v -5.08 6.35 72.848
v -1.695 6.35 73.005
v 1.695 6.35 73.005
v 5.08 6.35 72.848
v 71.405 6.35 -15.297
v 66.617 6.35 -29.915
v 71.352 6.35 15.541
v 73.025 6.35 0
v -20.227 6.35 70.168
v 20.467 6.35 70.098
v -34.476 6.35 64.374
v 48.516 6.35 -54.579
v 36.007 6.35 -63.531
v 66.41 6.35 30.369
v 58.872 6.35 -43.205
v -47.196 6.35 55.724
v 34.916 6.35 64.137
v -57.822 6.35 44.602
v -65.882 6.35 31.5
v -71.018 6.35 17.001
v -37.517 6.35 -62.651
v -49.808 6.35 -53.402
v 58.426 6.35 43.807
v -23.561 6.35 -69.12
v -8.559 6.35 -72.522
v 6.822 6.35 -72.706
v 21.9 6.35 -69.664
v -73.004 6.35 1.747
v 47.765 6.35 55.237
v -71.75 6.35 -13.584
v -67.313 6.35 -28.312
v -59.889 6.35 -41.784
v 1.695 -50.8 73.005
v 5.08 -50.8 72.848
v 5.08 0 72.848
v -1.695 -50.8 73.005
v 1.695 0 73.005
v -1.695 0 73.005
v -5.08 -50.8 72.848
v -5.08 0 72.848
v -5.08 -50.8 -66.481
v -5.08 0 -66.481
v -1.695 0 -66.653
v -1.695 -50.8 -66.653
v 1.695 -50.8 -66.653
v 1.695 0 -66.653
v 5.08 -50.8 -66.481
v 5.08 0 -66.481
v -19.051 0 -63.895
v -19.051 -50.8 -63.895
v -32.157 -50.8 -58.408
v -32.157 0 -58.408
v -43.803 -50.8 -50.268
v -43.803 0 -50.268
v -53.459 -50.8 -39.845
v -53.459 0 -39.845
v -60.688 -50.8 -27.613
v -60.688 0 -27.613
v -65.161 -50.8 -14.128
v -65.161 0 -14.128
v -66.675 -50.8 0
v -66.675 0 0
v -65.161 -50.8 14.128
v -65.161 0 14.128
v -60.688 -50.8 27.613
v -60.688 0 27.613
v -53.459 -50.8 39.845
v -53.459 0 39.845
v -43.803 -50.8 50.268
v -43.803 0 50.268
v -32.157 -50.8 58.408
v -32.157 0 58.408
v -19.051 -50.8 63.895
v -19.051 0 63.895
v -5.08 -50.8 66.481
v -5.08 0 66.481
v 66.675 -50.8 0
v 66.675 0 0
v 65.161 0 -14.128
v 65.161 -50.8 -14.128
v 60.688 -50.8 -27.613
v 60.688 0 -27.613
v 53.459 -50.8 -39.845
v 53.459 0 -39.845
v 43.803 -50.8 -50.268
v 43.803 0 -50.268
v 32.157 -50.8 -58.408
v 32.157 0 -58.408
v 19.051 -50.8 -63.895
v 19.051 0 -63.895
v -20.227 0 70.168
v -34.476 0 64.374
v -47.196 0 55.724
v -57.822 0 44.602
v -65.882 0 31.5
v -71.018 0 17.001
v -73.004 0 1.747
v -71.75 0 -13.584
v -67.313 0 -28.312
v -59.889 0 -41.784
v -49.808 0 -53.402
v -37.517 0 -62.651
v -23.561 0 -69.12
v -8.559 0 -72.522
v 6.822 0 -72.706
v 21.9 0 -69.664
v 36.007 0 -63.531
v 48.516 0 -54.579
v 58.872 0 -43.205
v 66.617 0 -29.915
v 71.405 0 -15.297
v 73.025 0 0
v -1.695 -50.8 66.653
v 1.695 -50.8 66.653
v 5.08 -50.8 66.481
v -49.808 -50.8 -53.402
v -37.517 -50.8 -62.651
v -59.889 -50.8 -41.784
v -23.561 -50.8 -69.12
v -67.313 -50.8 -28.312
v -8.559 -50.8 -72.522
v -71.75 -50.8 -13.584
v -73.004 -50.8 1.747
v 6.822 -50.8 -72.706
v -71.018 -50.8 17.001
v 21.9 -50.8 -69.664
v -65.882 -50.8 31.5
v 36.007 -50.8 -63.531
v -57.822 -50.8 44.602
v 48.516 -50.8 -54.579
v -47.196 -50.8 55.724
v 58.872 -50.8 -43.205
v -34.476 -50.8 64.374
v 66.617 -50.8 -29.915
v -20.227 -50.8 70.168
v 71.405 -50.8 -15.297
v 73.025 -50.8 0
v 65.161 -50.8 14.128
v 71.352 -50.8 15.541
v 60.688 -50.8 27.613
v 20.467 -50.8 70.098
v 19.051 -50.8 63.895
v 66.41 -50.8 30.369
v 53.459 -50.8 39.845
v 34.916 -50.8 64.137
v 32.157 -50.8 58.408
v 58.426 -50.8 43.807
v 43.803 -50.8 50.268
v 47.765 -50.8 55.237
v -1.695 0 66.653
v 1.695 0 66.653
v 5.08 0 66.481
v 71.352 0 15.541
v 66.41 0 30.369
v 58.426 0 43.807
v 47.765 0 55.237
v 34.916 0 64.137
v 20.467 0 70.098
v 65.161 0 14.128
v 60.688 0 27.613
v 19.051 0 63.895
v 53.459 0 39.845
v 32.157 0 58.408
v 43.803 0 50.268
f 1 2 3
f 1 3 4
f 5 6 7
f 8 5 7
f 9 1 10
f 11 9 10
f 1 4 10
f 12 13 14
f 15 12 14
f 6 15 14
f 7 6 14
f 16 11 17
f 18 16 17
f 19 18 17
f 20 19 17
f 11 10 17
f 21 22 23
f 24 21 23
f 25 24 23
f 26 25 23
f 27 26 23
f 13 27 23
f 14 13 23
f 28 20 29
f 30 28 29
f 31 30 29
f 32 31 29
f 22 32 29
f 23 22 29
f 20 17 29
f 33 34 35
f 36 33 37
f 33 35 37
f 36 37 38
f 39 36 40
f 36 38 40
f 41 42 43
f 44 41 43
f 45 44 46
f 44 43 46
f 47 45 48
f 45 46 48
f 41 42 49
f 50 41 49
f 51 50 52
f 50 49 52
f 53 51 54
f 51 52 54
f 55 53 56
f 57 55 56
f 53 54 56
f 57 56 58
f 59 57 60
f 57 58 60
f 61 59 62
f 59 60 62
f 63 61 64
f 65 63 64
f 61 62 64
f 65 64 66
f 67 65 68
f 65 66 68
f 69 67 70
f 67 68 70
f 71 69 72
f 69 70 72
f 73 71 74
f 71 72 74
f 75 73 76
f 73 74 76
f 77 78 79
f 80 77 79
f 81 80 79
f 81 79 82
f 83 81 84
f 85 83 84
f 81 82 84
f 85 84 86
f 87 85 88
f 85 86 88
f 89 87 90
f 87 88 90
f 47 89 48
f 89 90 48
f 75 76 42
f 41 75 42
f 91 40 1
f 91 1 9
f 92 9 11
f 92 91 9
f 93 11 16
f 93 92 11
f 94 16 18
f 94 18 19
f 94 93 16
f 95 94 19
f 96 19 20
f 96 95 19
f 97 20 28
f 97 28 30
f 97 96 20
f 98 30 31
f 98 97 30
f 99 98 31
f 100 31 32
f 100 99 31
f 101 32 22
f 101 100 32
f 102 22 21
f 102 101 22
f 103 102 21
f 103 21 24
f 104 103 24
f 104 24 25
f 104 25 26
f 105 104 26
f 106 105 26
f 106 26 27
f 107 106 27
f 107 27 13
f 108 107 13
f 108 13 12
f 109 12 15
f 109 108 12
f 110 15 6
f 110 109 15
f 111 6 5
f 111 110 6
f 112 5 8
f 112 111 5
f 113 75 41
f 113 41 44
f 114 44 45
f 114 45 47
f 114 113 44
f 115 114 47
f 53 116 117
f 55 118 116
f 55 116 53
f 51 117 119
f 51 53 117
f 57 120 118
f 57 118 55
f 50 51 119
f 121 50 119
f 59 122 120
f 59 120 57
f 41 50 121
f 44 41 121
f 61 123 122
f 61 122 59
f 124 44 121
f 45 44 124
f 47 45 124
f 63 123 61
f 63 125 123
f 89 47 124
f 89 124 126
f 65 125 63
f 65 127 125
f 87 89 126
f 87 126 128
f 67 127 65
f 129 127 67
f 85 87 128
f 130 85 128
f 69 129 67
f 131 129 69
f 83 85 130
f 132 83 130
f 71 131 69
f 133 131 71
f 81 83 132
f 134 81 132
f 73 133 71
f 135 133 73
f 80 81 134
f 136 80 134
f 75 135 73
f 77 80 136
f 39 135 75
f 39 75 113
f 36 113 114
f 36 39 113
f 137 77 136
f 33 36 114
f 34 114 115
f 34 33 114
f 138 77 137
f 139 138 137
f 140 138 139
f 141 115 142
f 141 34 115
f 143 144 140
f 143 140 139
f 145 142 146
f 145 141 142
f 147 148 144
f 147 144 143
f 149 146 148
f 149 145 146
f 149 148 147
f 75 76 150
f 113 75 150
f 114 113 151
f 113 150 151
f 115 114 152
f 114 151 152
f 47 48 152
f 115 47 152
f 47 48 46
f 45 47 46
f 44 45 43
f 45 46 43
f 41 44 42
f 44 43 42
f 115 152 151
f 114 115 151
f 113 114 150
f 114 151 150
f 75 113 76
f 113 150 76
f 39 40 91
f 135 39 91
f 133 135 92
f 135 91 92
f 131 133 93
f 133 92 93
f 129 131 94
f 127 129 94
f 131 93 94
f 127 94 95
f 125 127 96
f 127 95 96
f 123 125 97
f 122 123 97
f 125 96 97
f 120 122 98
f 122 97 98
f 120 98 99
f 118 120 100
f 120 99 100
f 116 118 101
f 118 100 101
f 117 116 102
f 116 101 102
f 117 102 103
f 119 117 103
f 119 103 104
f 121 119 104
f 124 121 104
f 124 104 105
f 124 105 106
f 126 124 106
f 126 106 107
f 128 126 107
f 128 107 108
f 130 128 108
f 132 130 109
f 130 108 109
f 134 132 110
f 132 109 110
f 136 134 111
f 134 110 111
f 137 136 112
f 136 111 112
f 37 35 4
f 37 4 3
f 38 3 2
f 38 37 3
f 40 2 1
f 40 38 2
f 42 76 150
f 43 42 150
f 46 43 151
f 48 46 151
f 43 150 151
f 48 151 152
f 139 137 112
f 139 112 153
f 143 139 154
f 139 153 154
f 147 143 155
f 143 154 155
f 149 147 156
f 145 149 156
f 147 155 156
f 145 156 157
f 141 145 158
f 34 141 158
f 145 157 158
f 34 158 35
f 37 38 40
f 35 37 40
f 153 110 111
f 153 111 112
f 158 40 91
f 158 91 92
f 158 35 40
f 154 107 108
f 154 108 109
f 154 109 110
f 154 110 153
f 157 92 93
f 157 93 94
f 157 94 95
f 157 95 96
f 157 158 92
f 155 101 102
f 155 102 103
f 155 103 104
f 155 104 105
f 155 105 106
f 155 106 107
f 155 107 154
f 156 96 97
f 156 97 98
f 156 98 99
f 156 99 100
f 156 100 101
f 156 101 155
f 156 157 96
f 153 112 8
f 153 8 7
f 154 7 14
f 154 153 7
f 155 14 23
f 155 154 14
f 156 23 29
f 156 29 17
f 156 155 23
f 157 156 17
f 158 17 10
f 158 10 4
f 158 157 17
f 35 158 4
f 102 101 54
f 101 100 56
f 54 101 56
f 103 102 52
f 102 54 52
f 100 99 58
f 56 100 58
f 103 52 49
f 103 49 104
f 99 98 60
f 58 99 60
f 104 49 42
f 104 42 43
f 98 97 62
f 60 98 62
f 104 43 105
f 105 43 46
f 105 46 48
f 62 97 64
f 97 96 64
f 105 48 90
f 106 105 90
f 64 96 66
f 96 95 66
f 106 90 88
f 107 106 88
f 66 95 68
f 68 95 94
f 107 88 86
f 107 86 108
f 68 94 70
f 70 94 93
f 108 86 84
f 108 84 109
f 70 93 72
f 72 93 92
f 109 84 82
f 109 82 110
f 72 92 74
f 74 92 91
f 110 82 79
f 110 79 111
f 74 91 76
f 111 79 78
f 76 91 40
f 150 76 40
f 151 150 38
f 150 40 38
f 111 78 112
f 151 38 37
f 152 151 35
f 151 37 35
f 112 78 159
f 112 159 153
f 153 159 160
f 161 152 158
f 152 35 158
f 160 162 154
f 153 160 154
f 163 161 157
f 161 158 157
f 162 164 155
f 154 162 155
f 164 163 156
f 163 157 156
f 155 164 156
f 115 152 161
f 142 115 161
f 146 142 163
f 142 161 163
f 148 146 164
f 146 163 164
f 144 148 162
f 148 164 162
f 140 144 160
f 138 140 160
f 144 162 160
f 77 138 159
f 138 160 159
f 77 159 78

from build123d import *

# Parameters (mm, degrees)
F1_DEPTH = 6.35
F2_DEPTH = 50.8
F3_DEPTH = 50.8


with BuildPart() as f1:
    # F0 (on Front) → F1 (new body)
    with BuildSketch(Plane.XZ):
        with BuildLine():
            ThreePointArc((-5.08, 72.8480900573), (-49.8080496757, -53.4023296542), (73.025, 0))
            ThreePointArc((73.025, 0), (53.4023296542, 49.8080496757), (5.08, 72.8480900573))
            Line((5.08, 72.8480900573), (5.08, 66.4811945215))
            ThreePointArc((5.08, 66.4811945215), (48.909429689, 45.3147140838), (66.675, 0))
            ThreePointArc((66.675, 0), (48.909429689, -45.3147140838), (5.08, -66.4811945215))
            ThreePointArc((5.08, -66.4811945215), (0, -66.675), (-5.08, -66.4811945215))
            ThreePointArc((-5.08, -66.4811945215), (-66.675, 0), (-5.08, 66.4811945215))
            Line((-5.08, 66.4811945215), (-5.08, 72.8480900573))
        make_face()
        with BuildLine():
            Line((5.08, 66.4811945215), (5.08, 72.8480900573))
            ThreePointArc((5.08, 72.8480900573), (0, 73.025), (-5.08, 72.8480900573))
            Line((-5.08, 72.8480900573), (-5.08, 66.4811945215))
            ThreePointArc((-5.08, 66.4811945215), (0, 66.675), (5.08, 66.4811945215))
        make_face()
        with BuildLine():
            Line((5.08, -66.4811945215), (5.08, 66.4811945215))
            ThreePointArc((5.08, 66.4811945215), (0, 66.675), (-5.08, 66.4811945215))
            Line((-5.08, 66.4811945215), (-5.08, 0))
            Line((-5.08, 0), (-5.08, -66.4811945215))
            ThreePointArc((-5.08, -66.4811945215), (0, -66.675), (5.08, -66.4811945215))
        make_face()
        with BuildLine():
            ThreePointArc((66.675, 0), (48.909429689, 45.3147140838), (5.08, 66.4811945215))
            Line((5.08, 66.4811945215), (5.08, -66.4811945215))
            ThreePointArc((5.08, -66.4811945215), (48.909429689, -45.3147140838), (66.675, 0))
        make_face()
        with BuildLine():
            Line((-5.08, 0), (-5.08, 66.4811945215))
            ThreePointArc((-5.08, 66.4811945215), (-66.675, 0), (-5.08, -66.4811945215))
            Line((-5.08, -66.4811945215), (-5.08, 0))
        make_face()
    extrude(amount=-F1_DEPTH)


with BuildPart() as f2:
    # F0 (on Front) → F2 (new body)
    with BuildSketch(Plane.XZ):
        with BuildLine():
            ThreePointArc((-5.08, 72.8480900573), (-49.8080496757, -53.4023296542), (73.025, 0))
            ThreePointArc((73.025, 0), (53.4023296542, 49.8080496757), (5.08, 72.8480900573))
            Line((5.08, 72.8480900573), (5.08, 66.4811945215))
            ThreePointArc((5.08, 66.4811945215), (48.909429689, 45.3147140838), (66.675, 0))
            ThreePointArc((66.675, 0), (48.909429689, -45.3147140838), (5.08, -66.4811945215))
            ThreePointArc((5.08, -66.4811945215), (0, -66.675), (-5.08, -66.4811945215))
            ThreePointArc((-5.08, -66.4811945215), (-66.675, 0), (-5.08, 66.4811945215))
            Line((-5.08, 66.4811945215), (-5.08, 72.8480900573))
        make_face()
        with BuildLine():
            Line((5.08, 66.4811945215), (5.08, 72.8480900573))
            ThreePointArc((5.08, 72.8480900573), (0, 73.025), (-5.08, 72.8480900573))
            Line((-5.08, 72.8480900573), (-5.08, 66.4811945215))
            ThreePointArc((-5.08, 66.4811945215), (0, 66.675), (5.08, 66.4811945215))
        make_face()
    extrude(amount=F2_DEPTH)


with BuildPart() as f3:
    # F0 (on Front) → F3 (new body)
    with BuildSketch(Plane.XZ):
        with BuildLine():
            Line((5.08, -66.4811945215), (5.08, 66.4811945215))
            ThreePointArc((5.08, 66.4811945215), (0, 66.675), (-5.08, 66.4811945215))
            Line((-5.08, 66.4811945215), (-5.08, 0))
            Line((-5.08, 0), (-5.08, -66.4811945215))
            ThreePointArc((-5.08, -66.4811945215), (0, -66.675), (5.08, -66.4811945215))
        make_face()
    extrude(amount=F3_DEPTH)


solid = Compound([f1.part, f2.part, f3.part])
